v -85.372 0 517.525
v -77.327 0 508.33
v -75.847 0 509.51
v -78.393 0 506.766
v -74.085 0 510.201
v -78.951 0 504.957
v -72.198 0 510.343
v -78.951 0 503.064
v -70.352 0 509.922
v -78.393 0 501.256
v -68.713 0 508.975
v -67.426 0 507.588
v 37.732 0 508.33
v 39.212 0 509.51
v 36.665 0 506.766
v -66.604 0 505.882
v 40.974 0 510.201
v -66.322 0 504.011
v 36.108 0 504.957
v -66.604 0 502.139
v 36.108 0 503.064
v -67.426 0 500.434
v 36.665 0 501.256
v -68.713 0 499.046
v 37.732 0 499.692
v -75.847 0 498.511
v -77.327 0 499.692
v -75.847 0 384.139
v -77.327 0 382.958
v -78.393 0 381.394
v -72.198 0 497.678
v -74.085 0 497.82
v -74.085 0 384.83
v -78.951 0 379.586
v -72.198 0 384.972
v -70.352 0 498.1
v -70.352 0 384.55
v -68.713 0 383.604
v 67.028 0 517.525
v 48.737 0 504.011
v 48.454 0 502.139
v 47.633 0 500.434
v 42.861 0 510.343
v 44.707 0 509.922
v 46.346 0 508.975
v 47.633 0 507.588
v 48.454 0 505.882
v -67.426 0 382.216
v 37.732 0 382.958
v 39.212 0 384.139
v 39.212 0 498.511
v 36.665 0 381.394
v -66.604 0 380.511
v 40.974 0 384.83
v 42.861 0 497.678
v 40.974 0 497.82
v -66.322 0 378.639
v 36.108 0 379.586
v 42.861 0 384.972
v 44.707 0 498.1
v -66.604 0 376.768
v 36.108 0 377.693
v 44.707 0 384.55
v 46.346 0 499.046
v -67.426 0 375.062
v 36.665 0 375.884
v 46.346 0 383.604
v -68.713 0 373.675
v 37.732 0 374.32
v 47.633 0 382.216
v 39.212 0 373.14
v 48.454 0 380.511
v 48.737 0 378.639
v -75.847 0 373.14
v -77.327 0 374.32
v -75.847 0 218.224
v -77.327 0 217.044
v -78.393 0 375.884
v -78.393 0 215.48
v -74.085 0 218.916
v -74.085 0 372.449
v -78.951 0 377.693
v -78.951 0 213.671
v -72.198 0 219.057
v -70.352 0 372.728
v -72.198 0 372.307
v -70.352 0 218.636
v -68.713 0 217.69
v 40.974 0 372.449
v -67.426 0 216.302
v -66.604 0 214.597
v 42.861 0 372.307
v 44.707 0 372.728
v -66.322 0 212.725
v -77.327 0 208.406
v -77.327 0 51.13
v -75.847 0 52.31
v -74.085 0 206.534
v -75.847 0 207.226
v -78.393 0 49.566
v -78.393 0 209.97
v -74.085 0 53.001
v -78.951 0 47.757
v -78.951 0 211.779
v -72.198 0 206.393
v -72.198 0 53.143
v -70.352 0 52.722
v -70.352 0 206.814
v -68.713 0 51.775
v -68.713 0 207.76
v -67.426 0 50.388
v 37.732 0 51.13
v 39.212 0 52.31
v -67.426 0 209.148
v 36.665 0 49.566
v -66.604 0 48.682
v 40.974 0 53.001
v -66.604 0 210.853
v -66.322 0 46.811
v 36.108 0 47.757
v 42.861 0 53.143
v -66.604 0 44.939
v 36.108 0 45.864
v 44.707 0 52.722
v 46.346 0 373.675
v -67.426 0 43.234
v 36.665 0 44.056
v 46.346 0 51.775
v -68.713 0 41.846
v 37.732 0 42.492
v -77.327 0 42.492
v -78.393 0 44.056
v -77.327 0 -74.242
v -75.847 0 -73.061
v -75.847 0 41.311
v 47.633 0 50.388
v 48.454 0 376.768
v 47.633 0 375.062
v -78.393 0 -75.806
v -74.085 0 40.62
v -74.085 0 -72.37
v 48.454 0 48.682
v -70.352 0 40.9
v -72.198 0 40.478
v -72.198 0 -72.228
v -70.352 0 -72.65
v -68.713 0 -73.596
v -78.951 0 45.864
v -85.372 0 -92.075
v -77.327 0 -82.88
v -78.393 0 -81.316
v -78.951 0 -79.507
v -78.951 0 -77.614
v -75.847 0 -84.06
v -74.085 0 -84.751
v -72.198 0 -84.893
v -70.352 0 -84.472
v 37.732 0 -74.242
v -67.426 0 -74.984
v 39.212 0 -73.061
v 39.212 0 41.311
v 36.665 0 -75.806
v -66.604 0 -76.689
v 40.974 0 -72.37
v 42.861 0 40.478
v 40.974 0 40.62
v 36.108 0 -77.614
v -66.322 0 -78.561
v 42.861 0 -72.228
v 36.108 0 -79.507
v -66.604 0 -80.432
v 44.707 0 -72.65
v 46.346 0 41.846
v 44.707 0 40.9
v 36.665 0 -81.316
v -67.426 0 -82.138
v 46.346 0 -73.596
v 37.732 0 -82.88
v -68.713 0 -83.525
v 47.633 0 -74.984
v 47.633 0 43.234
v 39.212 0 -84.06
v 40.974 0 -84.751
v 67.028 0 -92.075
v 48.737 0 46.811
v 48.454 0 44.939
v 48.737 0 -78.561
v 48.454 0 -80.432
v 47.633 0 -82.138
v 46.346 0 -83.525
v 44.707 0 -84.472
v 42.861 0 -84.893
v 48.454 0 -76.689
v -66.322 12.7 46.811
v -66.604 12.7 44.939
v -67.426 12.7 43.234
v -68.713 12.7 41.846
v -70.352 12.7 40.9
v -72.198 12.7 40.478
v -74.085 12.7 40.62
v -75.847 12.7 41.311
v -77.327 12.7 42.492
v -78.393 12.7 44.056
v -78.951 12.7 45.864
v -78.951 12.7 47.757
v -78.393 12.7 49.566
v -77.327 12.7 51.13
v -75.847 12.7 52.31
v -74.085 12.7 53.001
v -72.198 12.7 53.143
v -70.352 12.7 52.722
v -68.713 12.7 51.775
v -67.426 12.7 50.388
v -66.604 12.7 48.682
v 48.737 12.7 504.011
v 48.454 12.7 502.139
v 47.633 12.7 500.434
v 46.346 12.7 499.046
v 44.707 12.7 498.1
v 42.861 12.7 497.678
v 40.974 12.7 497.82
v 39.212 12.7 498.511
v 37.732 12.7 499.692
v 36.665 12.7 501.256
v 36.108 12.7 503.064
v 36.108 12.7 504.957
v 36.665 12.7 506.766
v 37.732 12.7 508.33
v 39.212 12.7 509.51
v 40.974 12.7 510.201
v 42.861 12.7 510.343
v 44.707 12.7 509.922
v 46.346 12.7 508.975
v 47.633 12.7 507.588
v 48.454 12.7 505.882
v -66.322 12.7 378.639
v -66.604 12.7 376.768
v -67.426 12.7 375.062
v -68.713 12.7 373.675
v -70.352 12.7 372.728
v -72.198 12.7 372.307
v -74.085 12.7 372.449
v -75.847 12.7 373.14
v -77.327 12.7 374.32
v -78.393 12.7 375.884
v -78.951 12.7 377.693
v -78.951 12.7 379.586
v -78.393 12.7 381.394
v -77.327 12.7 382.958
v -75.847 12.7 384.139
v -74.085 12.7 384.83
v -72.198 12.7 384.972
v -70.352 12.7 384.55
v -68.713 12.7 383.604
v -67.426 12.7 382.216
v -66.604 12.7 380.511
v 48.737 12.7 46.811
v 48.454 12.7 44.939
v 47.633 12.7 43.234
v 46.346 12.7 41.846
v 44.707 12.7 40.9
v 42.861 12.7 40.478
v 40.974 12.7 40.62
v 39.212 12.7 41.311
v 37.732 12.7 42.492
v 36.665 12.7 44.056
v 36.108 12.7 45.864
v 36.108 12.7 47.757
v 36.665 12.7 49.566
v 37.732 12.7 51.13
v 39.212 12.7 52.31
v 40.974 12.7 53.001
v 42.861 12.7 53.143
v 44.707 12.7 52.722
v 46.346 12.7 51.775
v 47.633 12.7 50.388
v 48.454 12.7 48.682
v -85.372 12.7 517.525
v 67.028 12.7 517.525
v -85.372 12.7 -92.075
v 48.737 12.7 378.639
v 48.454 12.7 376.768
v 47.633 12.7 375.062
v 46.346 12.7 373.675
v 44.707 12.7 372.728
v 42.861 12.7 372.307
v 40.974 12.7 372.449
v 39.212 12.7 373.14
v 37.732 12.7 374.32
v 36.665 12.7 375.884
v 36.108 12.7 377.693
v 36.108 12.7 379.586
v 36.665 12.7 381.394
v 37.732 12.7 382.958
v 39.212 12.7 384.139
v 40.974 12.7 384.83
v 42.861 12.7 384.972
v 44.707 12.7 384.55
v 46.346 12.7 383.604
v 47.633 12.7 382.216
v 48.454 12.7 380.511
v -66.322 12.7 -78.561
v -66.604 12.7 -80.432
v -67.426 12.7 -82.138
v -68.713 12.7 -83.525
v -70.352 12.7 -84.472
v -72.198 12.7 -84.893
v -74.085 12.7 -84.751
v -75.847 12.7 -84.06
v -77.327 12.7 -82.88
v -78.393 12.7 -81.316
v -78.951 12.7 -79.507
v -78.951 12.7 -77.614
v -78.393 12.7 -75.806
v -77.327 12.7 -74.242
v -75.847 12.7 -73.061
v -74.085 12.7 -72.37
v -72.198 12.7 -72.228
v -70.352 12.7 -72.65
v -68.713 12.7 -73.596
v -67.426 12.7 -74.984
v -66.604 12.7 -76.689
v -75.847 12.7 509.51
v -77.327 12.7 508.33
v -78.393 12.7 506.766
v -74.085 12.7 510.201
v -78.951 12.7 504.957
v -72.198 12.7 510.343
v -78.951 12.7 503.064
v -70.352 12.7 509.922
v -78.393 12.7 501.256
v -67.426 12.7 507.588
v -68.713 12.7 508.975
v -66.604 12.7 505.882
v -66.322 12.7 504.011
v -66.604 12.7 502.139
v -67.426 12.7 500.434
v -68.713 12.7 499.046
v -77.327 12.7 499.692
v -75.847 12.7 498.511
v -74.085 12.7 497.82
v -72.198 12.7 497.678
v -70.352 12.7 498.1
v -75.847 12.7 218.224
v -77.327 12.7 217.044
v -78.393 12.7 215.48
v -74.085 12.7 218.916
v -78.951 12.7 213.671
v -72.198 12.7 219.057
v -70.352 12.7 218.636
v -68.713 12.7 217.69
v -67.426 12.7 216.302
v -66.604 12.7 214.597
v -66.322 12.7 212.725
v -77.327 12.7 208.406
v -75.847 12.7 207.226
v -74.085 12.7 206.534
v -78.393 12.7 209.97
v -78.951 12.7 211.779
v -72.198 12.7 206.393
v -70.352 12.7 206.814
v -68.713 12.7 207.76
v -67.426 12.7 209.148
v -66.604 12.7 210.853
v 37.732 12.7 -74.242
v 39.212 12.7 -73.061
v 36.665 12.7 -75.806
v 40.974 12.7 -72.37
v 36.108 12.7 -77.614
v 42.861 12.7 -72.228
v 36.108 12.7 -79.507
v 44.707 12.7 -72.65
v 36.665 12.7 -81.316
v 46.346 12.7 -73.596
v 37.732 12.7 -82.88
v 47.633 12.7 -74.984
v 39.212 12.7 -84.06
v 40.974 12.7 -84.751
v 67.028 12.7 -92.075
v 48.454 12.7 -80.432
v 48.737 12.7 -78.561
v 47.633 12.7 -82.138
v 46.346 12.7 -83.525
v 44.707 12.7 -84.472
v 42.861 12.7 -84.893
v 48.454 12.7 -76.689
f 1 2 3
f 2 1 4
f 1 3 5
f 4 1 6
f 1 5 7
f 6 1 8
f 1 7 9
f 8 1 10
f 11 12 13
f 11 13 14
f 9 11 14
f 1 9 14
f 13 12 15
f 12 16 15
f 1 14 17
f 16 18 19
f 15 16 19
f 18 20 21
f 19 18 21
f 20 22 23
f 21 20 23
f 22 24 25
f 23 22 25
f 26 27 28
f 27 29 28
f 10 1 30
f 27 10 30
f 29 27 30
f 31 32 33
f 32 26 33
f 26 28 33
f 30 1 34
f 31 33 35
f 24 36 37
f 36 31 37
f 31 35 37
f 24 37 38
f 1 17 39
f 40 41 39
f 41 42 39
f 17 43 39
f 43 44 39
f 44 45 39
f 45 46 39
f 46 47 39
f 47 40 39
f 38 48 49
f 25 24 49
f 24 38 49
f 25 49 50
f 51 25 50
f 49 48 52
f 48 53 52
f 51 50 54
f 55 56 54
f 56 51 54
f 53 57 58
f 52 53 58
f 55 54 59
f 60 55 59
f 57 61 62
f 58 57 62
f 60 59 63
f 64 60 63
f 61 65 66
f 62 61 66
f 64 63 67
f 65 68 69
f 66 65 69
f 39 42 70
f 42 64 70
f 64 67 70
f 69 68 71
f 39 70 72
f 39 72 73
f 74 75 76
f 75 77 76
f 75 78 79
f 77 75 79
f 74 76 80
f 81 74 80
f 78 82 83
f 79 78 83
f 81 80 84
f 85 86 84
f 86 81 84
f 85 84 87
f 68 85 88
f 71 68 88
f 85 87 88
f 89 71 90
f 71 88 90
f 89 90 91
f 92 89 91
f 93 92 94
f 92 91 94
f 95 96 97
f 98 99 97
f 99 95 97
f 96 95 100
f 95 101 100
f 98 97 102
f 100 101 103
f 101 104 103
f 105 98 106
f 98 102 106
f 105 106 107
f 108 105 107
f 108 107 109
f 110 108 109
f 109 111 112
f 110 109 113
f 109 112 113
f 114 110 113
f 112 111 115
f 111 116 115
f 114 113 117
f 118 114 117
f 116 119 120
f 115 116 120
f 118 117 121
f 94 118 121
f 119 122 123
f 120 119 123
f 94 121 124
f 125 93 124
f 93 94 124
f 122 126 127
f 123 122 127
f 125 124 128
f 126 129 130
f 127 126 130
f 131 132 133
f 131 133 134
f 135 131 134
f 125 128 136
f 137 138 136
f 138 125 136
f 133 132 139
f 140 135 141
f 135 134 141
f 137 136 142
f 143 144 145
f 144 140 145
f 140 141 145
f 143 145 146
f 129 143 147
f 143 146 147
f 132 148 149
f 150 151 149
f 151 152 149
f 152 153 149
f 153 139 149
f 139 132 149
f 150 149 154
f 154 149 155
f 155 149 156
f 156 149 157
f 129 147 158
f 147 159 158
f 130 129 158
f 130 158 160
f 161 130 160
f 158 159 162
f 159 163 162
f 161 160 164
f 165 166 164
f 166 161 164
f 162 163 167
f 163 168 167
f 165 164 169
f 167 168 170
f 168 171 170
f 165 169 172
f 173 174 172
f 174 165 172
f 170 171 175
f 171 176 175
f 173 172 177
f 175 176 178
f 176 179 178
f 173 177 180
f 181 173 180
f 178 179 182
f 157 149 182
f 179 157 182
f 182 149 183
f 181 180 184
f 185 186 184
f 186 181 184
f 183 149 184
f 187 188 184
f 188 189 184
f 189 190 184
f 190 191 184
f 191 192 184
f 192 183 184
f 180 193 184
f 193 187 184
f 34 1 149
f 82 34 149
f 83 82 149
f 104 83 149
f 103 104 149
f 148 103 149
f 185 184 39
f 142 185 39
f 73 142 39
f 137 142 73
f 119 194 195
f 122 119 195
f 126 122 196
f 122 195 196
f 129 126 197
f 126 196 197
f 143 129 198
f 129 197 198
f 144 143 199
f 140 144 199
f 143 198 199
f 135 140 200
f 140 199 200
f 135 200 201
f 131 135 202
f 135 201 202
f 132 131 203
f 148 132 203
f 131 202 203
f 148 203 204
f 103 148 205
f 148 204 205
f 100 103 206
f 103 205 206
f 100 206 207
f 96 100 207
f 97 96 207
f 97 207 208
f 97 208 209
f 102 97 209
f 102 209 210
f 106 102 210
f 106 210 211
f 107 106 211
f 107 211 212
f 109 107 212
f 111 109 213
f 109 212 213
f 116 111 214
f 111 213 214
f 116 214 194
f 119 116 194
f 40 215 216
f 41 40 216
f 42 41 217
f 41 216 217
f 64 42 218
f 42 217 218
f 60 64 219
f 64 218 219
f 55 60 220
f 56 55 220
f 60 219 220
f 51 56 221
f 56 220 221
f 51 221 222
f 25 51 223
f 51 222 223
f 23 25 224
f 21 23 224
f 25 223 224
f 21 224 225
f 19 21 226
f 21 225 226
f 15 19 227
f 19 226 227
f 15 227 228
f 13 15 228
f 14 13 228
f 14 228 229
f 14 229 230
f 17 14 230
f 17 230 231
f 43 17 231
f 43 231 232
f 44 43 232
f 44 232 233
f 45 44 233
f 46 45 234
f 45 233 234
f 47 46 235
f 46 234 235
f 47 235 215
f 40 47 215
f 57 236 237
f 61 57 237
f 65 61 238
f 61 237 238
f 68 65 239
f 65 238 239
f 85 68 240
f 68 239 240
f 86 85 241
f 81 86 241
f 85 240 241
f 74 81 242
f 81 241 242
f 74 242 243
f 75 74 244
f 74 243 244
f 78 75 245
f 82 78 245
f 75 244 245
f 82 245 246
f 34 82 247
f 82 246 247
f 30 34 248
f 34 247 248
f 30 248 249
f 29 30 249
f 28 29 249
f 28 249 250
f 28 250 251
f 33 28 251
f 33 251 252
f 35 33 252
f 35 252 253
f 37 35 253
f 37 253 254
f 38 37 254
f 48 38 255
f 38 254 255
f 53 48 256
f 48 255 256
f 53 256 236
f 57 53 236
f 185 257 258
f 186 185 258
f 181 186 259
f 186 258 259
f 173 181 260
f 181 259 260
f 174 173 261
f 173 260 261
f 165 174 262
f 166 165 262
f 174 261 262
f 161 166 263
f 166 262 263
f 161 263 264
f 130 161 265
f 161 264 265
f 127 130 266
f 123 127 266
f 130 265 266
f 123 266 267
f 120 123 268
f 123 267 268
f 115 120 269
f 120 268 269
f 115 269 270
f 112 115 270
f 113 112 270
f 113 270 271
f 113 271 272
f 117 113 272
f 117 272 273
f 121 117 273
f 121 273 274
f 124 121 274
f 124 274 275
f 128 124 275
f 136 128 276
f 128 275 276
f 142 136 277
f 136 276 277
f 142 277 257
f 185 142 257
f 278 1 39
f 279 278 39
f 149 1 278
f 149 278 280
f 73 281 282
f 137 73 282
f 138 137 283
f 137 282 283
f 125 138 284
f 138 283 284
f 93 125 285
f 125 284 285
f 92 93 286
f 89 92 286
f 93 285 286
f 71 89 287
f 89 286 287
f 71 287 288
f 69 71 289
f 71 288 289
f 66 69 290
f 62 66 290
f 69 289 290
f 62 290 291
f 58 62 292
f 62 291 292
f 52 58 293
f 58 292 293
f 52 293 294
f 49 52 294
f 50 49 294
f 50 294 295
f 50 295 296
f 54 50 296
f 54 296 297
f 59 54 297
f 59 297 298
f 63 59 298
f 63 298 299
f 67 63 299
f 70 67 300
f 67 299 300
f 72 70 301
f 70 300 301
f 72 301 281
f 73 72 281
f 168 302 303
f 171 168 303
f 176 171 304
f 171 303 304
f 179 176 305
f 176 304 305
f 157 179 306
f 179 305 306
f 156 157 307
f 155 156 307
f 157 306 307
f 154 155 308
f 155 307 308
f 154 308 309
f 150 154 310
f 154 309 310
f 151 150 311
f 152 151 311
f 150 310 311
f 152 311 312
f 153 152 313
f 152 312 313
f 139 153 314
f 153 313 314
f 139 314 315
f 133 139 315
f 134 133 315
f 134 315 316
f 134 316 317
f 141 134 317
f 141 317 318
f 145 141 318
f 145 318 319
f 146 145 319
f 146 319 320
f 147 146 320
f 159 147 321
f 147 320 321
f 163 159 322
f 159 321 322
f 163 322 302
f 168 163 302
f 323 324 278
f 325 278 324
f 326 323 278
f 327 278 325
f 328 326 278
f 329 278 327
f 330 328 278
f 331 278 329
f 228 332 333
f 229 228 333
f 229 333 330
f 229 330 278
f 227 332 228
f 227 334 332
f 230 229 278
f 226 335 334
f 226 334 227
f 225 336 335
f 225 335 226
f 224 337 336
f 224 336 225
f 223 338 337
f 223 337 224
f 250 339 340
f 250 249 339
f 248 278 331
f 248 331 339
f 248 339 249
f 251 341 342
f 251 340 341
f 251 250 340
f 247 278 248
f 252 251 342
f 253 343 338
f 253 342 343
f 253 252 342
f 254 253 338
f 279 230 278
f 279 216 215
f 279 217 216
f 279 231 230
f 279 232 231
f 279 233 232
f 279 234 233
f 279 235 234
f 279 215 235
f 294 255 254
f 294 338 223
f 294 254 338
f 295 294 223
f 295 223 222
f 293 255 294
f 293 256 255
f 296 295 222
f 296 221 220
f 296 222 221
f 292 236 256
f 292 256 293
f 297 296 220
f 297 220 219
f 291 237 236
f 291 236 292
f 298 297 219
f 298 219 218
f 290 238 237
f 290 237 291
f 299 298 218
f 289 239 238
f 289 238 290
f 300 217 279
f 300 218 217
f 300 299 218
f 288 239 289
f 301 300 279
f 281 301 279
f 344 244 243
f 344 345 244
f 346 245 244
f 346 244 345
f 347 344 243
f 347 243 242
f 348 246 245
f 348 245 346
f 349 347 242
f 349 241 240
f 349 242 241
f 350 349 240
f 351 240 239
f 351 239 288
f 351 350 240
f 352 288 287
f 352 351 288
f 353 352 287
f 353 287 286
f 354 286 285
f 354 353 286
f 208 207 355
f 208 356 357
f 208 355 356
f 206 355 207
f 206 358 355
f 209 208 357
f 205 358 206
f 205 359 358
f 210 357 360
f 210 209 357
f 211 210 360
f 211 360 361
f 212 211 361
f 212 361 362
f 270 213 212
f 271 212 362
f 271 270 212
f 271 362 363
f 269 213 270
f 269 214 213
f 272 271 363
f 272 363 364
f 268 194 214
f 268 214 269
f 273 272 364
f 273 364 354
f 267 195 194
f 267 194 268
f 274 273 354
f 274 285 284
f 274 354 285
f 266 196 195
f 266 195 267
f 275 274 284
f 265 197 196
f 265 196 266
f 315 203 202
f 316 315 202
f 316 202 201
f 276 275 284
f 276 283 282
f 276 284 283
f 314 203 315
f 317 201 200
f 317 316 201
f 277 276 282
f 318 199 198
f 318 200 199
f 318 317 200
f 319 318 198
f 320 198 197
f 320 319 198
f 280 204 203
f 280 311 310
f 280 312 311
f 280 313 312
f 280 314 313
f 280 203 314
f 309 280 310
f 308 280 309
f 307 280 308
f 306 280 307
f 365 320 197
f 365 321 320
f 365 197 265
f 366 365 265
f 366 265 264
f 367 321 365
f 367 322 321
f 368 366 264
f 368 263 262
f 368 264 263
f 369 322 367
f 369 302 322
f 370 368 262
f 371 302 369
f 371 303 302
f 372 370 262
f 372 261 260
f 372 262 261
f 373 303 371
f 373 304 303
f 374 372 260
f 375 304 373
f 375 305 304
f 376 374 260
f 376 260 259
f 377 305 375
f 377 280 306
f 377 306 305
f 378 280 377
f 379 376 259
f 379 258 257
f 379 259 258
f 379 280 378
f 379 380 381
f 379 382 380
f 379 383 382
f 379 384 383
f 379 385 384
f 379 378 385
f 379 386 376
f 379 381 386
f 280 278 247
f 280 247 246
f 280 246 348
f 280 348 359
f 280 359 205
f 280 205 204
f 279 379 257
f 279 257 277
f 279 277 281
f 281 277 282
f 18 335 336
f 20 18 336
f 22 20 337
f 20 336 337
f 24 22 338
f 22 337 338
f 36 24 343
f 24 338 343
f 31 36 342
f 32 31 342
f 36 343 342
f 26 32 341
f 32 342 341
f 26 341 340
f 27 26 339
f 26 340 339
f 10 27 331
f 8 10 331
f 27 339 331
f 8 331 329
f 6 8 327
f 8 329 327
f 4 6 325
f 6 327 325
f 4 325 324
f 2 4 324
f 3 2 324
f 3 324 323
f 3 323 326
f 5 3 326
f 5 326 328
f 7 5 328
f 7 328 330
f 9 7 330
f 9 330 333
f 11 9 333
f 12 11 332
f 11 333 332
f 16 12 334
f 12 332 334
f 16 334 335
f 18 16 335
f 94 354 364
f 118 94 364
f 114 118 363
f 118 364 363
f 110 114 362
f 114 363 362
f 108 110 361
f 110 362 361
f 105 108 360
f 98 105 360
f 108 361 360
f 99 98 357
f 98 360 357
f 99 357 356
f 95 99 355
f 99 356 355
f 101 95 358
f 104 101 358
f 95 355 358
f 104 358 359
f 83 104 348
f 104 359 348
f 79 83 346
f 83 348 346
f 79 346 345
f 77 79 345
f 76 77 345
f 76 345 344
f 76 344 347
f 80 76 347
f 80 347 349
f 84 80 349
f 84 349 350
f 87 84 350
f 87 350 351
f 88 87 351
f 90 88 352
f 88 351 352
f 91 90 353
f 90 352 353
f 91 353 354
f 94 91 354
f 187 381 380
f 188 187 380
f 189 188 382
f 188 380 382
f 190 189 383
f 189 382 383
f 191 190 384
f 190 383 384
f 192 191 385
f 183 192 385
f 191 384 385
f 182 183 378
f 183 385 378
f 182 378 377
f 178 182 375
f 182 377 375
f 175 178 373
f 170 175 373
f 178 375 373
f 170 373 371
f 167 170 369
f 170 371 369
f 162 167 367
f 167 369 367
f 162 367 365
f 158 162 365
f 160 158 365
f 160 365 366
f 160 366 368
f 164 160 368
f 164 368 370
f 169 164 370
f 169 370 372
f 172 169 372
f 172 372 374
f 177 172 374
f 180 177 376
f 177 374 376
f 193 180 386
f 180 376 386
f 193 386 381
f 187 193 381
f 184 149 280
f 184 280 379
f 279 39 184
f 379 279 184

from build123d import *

# Parameters (mm, degrees)
SKETCH1_W           = 152.4
SKETCH1_H           = 609.6
BOSS_EXTRUDE1_DEPTH = 12.7
SKETCH2_R           = 6.35
CUT_EXTRUDE1_DEPTH  = 12.7


with BuildPart() as part:
    # Sketch1 → Boss-Extrude1 (new body)
    with BuildSketch(Plane(origin=(0, 0, 0), x_dir=(1, 0, 0), z_dir=(0, 1, 0))):
        with Locations((-9.172222222, -212.725)):
            Rectangle(SKETCH1_W, SKETCH1_H)
    extrude(amount=BOSS_EXTRUDE1_DEPTH)

    # Sketch2 → Cut-Extrude1 (cut)
    with BuildSketch(Plane(origin=(0, 12.7, 0), x_dir=(1, 0, 0), z_dir=(0, 1, 0))):
        with Locations((-72.672222222, -212.725)):
            Circle(SKETCH2_R)
        with Locations((-72.672222222, -378.63932586)):
            Circle(SKETCH2_R)
        with Locations((-72.672222222, -504.01067414)):
            Circle(SKETCH2_R)
        with Locations((42.386596789, -504.01067414)):
            Circle(SKETCH2_R)
        with Locations((42.386596789, -378.63932586)):
            Circle(SKETCH2_R)
        with Locations((42.386596789, -46.81067414)):
            Circle(SKETCH2_R)
        with Locations((42.386596789, 78.56067414)):
            Circle(SKETCH2_R)
        with Locations((-72.672222222, -46.81067414)):
            Circle(SKETCH2_R)
        with Locations((-72.672222222, 78.56067414)):
            Circle(SKETCH2_R)
    extrude(amount=-CUT_EXTRUDE1_DEPTH, mode=Mode.SUBTRACT)


solid = part.part
